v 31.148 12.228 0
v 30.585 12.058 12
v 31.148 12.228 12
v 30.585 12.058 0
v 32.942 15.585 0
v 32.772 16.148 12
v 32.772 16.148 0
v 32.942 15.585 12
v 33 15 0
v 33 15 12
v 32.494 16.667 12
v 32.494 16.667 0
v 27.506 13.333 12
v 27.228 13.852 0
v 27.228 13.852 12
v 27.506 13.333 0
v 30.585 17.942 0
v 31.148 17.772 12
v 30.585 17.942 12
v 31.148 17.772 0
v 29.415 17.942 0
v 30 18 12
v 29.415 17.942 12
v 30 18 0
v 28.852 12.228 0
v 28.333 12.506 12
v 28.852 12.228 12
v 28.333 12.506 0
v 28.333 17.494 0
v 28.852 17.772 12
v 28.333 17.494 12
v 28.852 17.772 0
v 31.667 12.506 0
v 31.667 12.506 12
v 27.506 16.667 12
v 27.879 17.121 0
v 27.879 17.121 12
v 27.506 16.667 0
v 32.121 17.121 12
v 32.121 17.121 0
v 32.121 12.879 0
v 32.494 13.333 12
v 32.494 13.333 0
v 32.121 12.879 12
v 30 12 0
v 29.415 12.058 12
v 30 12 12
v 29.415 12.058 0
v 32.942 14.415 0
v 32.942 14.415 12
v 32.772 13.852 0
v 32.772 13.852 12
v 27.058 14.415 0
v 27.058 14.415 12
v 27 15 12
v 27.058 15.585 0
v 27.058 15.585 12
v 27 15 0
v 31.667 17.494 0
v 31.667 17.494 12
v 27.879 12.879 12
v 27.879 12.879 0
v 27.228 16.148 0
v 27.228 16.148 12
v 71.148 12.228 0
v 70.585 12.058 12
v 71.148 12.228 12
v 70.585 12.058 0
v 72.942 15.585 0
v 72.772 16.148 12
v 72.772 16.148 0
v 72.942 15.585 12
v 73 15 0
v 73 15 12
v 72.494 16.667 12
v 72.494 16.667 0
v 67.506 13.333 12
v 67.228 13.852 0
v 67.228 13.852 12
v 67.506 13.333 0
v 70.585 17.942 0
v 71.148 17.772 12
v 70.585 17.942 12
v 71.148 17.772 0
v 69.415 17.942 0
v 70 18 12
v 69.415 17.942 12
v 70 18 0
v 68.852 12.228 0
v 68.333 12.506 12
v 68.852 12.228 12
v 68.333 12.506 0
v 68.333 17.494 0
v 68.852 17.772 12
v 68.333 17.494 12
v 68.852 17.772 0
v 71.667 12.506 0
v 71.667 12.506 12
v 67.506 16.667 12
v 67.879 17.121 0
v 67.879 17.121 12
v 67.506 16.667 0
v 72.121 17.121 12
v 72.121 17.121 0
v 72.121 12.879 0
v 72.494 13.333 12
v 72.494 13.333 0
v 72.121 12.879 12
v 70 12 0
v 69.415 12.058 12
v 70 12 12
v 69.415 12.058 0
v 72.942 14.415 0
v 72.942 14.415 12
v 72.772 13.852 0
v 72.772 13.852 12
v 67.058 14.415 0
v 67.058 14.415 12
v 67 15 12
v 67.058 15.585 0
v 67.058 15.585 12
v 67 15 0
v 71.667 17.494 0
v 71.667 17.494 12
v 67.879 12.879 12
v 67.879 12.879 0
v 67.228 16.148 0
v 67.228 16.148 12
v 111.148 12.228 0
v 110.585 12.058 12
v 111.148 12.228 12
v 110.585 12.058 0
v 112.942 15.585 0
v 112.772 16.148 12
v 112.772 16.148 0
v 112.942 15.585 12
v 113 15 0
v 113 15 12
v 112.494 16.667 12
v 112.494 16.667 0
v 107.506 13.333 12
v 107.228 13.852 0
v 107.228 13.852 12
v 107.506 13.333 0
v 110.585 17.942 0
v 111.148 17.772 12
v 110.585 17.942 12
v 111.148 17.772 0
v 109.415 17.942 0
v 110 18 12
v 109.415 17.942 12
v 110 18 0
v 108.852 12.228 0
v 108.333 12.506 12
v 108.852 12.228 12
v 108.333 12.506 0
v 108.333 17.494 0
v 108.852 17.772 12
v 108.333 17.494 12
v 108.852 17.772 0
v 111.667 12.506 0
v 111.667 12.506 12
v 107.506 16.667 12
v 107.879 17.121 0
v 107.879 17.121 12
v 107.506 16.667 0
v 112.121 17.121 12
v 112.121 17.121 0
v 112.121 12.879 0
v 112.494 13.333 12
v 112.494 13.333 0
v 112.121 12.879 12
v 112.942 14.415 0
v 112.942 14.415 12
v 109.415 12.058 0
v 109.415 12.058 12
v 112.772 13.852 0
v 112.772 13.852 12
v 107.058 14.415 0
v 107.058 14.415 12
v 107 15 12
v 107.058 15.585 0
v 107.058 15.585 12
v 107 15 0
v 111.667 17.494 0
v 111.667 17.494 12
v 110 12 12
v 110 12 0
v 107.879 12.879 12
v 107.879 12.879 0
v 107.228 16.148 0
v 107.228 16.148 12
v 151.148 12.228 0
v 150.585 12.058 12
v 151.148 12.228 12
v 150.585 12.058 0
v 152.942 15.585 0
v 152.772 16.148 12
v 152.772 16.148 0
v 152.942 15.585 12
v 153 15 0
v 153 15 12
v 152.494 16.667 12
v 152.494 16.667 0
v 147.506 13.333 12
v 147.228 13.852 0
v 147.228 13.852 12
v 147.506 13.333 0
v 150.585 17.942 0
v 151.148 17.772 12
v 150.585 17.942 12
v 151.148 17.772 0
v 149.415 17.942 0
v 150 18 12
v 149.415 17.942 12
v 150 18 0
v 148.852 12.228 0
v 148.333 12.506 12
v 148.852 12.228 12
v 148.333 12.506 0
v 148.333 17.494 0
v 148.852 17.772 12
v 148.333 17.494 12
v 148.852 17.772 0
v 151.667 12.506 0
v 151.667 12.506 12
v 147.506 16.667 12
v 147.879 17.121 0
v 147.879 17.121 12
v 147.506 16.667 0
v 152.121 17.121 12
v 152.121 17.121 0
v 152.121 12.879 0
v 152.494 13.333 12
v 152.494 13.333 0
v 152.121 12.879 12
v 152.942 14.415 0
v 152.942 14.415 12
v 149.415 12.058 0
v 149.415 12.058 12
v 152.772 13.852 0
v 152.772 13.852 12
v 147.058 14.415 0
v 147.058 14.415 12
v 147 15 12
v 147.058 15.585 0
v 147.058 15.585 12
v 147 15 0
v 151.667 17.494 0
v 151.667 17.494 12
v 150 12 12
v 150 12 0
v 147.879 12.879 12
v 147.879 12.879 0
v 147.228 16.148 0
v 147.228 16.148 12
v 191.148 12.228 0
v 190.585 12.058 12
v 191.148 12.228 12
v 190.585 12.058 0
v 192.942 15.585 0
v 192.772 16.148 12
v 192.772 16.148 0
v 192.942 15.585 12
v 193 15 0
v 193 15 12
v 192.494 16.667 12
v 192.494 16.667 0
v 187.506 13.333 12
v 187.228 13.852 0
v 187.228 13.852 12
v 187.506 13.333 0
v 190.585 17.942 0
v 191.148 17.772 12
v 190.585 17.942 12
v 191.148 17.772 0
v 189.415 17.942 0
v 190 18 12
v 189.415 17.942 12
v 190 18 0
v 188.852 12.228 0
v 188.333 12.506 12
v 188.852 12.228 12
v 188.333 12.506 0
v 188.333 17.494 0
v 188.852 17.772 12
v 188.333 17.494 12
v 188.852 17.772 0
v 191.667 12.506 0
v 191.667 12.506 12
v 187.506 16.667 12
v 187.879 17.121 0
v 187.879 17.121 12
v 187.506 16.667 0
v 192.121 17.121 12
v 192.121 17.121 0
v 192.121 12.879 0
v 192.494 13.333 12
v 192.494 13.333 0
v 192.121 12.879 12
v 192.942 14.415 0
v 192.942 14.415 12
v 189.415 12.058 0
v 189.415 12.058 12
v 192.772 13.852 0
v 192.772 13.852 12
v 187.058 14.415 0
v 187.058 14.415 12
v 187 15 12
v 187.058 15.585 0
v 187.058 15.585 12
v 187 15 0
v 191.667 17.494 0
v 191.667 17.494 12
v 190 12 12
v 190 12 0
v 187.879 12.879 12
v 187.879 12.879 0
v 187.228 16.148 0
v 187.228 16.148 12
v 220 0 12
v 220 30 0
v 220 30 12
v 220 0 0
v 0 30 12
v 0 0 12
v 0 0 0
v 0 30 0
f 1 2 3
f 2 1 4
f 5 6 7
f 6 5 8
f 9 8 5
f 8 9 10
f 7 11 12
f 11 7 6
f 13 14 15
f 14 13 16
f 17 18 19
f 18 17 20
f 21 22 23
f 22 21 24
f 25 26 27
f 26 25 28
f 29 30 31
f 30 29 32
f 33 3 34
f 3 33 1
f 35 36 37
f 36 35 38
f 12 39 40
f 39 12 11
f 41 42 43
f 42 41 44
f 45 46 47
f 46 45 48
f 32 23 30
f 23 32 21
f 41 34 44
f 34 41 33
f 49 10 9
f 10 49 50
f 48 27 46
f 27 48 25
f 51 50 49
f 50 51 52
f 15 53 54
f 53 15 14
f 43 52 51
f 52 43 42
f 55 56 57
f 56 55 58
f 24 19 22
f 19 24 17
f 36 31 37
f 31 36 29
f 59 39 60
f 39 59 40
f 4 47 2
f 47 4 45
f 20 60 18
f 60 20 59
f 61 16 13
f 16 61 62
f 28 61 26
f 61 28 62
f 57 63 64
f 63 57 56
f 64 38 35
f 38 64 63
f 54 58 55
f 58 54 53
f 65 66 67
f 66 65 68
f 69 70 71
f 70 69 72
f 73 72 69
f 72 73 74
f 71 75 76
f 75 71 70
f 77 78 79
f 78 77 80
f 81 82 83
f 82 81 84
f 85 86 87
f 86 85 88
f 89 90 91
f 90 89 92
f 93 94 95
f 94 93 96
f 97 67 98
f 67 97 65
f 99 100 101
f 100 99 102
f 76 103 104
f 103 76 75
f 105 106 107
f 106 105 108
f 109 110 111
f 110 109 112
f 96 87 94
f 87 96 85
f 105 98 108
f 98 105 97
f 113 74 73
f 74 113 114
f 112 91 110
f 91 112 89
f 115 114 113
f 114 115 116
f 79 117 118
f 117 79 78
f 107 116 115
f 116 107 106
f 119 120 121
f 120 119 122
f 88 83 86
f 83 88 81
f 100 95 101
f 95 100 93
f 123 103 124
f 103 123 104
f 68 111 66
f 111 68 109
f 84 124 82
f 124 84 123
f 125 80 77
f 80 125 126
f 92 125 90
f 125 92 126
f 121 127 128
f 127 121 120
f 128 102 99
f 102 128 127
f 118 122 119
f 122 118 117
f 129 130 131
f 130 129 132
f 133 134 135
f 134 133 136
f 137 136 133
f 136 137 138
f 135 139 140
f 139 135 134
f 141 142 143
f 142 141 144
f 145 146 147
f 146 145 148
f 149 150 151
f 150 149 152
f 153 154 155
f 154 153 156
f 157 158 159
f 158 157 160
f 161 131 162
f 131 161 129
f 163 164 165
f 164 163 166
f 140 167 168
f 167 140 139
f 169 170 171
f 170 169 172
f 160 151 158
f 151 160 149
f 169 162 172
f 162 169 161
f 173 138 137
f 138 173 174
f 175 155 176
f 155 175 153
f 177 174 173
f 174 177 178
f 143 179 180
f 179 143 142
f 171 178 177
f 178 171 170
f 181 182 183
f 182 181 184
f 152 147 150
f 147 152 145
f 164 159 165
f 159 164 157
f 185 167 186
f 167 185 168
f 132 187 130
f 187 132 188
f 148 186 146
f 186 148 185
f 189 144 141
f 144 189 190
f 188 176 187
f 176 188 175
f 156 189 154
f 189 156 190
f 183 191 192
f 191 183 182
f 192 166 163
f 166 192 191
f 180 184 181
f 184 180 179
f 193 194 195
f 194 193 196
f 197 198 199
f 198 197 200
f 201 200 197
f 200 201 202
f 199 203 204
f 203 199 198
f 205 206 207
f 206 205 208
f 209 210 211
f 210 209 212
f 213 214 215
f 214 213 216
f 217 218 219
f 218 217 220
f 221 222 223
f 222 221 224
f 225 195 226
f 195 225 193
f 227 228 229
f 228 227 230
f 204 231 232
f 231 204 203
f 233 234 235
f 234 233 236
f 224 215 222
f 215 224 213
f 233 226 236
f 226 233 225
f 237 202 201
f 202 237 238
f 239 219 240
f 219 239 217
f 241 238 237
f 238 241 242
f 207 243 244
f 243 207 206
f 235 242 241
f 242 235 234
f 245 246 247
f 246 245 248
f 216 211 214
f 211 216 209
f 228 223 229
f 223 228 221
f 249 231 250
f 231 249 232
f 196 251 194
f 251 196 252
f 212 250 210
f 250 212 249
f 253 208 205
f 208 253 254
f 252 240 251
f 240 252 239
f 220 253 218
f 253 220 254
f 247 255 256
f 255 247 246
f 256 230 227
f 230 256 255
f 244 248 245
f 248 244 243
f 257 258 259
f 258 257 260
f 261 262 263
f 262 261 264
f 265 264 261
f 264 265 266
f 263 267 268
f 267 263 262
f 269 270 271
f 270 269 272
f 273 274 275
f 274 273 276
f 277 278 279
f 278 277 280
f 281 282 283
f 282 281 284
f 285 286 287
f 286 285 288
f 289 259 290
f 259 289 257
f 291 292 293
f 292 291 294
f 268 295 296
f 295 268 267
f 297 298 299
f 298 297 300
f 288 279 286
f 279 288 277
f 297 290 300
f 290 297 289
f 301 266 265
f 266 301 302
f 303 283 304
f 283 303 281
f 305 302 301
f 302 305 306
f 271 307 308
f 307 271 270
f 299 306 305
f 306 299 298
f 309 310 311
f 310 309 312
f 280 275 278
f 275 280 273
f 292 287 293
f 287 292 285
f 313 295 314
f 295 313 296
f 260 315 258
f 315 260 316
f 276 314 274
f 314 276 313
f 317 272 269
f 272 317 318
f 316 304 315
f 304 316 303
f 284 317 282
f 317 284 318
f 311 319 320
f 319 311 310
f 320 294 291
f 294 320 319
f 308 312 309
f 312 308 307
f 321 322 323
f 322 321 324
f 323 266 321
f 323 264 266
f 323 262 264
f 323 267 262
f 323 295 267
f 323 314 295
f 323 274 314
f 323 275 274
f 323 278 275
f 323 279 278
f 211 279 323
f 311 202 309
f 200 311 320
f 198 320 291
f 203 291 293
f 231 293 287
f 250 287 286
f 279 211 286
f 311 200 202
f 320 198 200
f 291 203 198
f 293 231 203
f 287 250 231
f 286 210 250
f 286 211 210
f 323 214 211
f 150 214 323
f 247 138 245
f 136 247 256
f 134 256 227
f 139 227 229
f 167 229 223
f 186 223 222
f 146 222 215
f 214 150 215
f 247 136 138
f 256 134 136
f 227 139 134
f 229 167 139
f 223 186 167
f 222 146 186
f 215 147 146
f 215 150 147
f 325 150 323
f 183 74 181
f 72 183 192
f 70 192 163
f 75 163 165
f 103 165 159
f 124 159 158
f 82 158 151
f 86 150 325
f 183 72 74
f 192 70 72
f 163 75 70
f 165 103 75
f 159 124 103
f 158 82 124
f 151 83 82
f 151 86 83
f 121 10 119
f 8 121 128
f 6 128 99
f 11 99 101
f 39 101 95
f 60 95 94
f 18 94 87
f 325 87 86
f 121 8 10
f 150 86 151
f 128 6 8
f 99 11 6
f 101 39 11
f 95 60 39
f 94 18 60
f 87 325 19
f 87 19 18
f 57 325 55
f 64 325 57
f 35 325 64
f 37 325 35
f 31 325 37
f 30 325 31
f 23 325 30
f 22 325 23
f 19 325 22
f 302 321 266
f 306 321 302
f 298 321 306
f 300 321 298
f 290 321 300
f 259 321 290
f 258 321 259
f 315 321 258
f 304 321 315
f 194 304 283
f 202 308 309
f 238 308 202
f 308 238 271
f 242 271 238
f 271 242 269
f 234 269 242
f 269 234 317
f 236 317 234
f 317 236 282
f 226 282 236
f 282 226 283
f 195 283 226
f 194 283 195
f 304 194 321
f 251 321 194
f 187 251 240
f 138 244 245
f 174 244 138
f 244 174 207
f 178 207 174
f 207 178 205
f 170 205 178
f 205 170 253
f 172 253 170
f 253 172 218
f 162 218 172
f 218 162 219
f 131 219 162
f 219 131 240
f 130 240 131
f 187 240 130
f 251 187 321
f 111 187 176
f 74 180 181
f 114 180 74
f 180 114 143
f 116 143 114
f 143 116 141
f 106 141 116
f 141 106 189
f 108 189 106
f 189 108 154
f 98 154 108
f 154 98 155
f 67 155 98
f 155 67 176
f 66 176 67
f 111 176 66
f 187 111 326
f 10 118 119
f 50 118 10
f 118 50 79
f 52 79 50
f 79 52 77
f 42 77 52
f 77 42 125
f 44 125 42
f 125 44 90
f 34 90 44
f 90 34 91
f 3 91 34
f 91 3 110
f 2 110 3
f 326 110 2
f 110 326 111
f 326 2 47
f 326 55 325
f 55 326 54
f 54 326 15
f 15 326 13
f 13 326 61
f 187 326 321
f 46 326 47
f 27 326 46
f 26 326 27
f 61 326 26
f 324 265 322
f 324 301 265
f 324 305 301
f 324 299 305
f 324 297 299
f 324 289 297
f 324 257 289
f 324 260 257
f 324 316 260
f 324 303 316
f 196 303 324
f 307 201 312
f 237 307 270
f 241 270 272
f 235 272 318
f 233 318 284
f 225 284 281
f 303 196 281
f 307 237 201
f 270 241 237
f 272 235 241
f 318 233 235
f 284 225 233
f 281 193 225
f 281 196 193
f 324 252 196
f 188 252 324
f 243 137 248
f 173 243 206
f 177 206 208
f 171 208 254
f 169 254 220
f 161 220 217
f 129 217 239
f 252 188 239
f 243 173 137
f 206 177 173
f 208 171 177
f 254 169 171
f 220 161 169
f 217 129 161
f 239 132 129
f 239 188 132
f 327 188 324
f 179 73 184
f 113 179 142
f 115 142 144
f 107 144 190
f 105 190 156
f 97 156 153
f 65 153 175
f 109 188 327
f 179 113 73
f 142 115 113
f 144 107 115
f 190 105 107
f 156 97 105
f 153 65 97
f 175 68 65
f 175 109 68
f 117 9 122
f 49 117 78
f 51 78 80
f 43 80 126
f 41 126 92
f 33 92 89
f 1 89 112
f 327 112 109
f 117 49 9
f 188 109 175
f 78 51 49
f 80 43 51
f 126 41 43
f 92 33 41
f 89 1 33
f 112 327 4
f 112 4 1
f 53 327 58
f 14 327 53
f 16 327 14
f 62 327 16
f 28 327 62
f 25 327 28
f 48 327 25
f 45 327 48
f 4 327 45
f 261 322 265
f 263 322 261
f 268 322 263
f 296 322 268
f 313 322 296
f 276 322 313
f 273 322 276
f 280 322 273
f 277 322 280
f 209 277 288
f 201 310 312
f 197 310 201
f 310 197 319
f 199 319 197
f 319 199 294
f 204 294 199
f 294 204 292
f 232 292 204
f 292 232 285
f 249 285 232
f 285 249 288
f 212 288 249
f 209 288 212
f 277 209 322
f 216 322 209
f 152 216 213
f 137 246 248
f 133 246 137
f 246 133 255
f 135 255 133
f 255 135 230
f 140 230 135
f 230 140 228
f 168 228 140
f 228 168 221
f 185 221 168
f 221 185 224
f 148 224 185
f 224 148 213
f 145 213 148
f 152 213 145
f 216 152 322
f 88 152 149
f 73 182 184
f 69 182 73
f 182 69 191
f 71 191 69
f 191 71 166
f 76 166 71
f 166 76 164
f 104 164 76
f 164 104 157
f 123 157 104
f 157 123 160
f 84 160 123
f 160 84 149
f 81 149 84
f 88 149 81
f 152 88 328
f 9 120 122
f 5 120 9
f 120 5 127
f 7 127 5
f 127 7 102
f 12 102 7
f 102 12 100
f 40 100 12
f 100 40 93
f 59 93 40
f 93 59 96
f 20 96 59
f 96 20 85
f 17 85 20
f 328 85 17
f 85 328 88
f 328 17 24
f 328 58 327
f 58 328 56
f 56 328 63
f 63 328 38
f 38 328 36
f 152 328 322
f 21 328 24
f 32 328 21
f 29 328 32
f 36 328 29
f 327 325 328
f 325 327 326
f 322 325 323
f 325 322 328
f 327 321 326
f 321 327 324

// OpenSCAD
$fn = 32;

// ----------------------------------------------------------------------
// Long rail: 200-250 mm mounting rail
// ----------------------------------------------------------------------

// --- parameters (mm) ---
rail_l = 220;             // rail length, X
rail_w = 30;              // rail width, Y
rail_t = 12;              // rail thickness, Z
hole_d = 6;               // mounting hole diameter
hole_start = 30;          // first hole offset from the end
hole_pitch = 40;          // hole pitch
holes = 5;                // number of holes

difference() {
  cube([rail_l, rail_w, rail_t]);
  for (i = [0 : holes - 1])
    translate([hole_start + i * hole_pitch, rail_w / 2, -1])
      cylinder(h = rail_t + 2, d = hole_d);
}
